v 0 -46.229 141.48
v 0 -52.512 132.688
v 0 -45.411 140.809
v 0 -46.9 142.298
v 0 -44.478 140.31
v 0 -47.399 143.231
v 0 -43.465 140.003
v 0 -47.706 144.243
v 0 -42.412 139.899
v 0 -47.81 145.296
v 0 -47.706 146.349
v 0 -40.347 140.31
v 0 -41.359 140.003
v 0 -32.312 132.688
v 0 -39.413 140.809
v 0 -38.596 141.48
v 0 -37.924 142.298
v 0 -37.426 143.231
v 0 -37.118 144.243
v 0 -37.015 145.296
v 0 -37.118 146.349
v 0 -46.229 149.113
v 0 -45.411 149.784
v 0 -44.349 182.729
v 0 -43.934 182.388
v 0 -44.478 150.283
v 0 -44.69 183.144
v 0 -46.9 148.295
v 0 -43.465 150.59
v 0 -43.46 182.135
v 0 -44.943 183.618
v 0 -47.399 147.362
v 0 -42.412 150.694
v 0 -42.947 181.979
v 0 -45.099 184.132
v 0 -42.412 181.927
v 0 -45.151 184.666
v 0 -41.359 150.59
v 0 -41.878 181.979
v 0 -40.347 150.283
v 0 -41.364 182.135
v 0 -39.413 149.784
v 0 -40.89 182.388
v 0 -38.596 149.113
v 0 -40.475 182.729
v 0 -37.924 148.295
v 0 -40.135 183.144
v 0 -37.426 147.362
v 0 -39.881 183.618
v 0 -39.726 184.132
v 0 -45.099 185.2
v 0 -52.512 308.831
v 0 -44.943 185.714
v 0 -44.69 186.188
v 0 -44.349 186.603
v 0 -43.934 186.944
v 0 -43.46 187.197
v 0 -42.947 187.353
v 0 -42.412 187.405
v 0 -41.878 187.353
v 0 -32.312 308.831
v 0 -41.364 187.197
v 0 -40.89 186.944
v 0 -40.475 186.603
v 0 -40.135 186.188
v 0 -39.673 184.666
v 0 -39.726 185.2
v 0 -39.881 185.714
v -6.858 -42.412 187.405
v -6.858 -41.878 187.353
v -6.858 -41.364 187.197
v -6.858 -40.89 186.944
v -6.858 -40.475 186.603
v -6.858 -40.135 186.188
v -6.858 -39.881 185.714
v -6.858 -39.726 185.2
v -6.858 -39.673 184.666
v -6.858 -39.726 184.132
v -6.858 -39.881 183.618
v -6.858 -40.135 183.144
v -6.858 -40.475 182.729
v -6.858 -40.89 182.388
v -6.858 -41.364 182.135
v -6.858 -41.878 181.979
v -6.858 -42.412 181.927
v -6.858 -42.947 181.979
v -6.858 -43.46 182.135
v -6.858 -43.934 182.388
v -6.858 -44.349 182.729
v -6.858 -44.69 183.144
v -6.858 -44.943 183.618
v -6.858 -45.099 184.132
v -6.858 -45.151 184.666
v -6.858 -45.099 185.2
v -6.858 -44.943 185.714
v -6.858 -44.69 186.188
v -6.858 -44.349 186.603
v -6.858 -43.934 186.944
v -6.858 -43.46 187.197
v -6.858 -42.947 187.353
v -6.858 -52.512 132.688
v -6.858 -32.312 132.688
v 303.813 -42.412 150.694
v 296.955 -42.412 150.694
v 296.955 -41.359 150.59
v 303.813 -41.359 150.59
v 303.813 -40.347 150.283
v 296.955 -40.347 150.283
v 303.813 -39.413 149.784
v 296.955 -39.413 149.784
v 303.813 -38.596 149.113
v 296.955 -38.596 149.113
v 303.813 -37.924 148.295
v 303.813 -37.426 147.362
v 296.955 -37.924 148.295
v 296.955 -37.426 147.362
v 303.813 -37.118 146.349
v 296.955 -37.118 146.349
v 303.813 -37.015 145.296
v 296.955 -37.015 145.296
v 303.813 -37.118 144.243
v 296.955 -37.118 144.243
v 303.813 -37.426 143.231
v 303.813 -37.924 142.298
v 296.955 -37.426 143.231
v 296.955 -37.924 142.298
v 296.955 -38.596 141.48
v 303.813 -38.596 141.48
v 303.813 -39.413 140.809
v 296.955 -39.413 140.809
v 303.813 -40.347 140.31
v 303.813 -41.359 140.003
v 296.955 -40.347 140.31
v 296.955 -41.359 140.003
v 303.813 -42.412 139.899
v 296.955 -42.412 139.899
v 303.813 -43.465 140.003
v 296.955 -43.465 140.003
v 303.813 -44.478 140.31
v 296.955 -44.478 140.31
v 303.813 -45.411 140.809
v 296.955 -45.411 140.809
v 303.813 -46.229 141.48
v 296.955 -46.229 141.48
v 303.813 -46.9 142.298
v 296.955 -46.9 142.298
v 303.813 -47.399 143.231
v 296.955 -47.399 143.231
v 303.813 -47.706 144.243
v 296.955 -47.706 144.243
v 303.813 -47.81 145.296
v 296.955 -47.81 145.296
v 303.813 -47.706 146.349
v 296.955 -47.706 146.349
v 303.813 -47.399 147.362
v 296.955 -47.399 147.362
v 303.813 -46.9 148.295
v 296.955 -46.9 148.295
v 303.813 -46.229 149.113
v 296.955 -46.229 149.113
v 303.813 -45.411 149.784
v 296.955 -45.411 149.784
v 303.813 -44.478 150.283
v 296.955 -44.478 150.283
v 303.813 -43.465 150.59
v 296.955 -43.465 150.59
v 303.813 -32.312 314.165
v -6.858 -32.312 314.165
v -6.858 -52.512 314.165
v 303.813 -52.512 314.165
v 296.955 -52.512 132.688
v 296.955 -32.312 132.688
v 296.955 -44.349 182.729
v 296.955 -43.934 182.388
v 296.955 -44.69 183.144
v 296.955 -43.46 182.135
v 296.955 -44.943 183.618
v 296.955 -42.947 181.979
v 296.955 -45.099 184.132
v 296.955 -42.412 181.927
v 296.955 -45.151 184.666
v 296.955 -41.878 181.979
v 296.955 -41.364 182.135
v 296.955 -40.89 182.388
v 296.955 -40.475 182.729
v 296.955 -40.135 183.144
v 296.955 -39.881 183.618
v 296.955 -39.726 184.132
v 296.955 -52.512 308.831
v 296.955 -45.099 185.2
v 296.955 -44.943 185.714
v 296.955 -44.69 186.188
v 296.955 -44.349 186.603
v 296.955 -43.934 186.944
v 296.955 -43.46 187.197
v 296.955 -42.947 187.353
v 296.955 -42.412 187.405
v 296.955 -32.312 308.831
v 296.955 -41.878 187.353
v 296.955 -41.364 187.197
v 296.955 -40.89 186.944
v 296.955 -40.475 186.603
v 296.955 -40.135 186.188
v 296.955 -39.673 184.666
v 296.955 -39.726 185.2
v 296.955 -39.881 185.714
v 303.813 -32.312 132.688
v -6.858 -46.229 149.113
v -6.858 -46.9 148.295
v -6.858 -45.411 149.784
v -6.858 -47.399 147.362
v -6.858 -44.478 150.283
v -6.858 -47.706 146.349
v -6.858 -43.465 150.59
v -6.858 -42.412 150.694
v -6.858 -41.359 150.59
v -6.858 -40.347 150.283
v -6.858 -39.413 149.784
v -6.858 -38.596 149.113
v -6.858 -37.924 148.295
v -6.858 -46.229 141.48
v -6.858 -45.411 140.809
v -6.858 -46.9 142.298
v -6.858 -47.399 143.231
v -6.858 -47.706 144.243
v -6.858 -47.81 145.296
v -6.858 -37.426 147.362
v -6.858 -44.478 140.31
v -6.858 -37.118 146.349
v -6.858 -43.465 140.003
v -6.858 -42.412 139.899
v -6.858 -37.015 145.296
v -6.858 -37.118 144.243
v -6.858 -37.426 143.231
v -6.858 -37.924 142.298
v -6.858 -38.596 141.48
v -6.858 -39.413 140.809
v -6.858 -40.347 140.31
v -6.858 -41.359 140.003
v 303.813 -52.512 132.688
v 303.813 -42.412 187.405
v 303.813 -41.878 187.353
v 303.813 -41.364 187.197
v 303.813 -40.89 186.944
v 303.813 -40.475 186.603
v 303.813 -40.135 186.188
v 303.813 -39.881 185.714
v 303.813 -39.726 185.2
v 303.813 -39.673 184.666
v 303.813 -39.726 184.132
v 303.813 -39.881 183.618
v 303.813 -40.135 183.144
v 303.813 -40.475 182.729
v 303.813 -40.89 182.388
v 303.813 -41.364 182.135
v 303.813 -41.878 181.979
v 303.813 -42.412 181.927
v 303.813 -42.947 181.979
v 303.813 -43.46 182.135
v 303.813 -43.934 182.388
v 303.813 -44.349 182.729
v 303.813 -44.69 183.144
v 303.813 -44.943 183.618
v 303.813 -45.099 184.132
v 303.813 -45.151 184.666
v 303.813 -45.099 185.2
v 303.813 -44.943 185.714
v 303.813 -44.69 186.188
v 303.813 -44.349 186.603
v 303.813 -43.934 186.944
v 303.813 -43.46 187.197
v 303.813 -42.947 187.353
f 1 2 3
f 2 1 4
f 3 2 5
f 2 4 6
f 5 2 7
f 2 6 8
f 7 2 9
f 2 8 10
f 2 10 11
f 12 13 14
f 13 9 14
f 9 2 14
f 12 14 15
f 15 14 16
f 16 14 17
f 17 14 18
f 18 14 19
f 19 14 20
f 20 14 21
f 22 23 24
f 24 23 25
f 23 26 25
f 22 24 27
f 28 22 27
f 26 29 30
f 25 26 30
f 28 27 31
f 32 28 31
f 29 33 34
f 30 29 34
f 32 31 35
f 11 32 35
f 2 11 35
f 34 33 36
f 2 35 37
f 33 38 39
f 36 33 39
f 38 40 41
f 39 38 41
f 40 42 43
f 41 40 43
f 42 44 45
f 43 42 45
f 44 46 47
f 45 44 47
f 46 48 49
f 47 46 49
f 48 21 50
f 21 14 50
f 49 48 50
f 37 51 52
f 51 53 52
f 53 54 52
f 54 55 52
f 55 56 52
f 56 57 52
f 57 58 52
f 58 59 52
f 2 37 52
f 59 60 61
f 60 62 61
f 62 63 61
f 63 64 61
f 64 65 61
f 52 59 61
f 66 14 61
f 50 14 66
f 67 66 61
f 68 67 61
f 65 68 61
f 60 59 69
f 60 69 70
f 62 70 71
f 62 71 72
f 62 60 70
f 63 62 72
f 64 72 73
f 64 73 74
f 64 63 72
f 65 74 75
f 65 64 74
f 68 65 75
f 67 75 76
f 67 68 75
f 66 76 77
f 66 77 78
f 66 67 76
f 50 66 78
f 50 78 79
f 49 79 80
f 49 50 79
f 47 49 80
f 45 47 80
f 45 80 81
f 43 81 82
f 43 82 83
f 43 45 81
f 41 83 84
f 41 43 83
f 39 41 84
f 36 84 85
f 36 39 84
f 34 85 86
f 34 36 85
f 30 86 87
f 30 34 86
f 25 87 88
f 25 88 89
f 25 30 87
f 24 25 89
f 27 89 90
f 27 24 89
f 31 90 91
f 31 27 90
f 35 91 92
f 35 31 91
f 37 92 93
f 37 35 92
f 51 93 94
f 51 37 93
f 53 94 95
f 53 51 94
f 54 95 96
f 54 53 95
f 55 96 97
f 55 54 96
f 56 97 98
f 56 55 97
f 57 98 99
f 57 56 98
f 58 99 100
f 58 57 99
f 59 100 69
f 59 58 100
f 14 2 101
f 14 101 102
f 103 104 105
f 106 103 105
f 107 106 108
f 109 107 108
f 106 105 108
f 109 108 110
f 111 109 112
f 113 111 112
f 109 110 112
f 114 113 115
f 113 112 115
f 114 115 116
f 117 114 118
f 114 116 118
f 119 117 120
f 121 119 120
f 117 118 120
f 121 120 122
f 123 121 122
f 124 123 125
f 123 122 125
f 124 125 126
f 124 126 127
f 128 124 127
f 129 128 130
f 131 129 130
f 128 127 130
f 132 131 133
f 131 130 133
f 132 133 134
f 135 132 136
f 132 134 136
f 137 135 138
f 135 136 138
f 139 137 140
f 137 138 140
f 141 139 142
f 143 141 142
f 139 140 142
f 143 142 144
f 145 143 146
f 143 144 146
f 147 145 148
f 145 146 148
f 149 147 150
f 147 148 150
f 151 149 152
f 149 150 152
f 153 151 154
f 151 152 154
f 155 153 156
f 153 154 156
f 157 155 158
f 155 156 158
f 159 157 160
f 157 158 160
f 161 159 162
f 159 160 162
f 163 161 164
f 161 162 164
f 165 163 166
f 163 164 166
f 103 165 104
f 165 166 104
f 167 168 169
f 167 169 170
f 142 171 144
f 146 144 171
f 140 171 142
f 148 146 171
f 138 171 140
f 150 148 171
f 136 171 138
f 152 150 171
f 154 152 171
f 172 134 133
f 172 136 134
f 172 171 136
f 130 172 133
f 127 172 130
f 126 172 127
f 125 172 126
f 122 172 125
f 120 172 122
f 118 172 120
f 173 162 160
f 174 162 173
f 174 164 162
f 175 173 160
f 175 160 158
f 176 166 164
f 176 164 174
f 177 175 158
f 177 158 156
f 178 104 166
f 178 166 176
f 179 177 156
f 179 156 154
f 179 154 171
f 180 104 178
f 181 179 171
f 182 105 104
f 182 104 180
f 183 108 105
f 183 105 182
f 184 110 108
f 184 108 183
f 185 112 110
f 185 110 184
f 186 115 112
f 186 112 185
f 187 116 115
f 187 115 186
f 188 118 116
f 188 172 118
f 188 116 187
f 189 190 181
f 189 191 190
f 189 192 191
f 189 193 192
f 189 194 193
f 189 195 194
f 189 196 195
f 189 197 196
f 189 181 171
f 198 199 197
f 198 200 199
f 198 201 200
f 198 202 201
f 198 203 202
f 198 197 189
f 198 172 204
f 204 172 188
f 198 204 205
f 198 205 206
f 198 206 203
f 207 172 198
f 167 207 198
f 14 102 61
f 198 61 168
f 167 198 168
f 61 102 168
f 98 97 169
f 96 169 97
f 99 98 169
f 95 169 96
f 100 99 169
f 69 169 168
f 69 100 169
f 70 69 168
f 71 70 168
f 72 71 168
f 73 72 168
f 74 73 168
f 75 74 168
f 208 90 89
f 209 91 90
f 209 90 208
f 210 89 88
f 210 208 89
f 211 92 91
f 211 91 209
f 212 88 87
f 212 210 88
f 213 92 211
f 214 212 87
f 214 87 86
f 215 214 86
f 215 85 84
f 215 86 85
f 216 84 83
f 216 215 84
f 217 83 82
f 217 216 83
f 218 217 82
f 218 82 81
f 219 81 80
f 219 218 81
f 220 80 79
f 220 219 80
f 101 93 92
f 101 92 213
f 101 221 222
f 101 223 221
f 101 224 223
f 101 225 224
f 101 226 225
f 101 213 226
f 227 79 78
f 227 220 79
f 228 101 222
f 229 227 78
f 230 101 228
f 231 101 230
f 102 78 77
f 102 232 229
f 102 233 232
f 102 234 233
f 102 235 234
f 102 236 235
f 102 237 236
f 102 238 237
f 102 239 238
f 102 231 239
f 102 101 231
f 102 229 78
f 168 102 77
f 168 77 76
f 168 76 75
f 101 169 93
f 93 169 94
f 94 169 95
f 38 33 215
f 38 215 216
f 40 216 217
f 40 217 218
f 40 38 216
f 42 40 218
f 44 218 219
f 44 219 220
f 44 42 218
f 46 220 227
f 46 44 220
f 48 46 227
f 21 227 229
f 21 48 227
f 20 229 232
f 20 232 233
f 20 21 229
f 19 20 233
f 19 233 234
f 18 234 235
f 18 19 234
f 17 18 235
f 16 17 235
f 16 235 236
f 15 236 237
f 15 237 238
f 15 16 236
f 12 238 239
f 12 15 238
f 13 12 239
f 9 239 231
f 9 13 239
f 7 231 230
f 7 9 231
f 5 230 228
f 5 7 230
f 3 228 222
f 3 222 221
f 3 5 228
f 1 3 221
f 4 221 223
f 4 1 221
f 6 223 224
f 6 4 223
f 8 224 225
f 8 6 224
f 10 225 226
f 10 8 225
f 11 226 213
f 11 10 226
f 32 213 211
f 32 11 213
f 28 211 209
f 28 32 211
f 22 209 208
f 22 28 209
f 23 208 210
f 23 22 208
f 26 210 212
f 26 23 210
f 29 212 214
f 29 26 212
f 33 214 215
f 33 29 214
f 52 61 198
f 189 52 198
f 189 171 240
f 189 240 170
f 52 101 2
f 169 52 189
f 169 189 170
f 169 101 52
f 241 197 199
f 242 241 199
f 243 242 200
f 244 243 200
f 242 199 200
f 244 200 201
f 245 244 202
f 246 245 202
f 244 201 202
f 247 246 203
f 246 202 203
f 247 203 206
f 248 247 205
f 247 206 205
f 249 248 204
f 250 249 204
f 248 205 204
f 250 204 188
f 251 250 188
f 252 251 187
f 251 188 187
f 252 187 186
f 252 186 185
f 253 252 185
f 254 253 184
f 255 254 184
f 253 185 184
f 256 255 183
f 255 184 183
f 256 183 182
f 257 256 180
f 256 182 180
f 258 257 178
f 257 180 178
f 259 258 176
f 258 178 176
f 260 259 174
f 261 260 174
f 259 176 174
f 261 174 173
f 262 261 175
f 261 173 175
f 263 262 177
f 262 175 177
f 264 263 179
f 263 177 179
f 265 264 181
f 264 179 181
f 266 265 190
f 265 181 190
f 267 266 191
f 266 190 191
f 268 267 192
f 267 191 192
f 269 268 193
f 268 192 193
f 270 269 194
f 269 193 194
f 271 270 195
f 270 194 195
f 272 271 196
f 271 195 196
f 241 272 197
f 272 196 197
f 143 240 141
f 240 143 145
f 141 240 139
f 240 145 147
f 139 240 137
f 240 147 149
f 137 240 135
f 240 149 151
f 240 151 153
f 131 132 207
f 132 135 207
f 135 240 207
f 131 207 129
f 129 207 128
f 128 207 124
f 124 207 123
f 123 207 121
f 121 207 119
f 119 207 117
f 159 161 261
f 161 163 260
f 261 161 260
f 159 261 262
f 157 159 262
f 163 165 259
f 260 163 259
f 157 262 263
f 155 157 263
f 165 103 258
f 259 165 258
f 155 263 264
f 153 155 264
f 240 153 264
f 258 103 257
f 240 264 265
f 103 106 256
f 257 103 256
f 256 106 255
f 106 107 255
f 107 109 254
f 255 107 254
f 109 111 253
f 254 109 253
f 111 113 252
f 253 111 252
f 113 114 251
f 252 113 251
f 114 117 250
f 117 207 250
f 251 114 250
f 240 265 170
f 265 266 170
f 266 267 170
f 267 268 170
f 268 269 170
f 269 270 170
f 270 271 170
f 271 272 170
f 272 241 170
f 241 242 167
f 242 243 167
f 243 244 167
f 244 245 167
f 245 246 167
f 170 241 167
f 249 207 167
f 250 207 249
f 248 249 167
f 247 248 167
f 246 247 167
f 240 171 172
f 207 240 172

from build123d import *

# Parameters (mm, degrees)
SKETCH1_W           = 176.143624501
SKETCH1_H           = 20.199458611
SKETCH1_R           = 5.3975
SKETCH1_R_2         = 2.73924182
BOSS_EXTRUDE1_DEPTH = 6.858
SKETCH5_W           = 310.671331162
SKETCH5_H           = 20.199458611
BOSS_EXTRUDE4_DEPTH = 5.334


with BuildPart() as part:
    # Sketch1 → Boss-Extrude1 (new body)
    with BuildSketch(Plane.ZY):
        with Locations((220.759467441, -42.412189395)):
            Rectangle(SKETCH1_W, SKETCH1_H)
        with Locations((145.296375125, -42.412189394)):
            Circle(SKETCH1_R, mode=Mode.SUBTRACT)
        with Locations((184.665923862, -42.412189394)):
            Circle(SKETCH1_R_2, mode=Mode.SUBTRACT)
    boss_extrude1 = extrude(amount=BOSS_EXTRUDE1_DEPTH)

    # Sketch5 → Boss-Extrude4 (add)
    with BuildSketch(Plane.XY.offset(308.831279691)):
        with Locations((148.477665581, -42.412189395)):
            Rectangle(SKETCH5_W, SKETCH5_H)
    extrude(amount=BOSS_EXTRUDE4_DEPTH)

    # Mirror1: Boss-Extrude1 across plane
    add(boss_extrude1.mirror(Plane.ZY.offset(-148.477665581)))


solid = part.part
